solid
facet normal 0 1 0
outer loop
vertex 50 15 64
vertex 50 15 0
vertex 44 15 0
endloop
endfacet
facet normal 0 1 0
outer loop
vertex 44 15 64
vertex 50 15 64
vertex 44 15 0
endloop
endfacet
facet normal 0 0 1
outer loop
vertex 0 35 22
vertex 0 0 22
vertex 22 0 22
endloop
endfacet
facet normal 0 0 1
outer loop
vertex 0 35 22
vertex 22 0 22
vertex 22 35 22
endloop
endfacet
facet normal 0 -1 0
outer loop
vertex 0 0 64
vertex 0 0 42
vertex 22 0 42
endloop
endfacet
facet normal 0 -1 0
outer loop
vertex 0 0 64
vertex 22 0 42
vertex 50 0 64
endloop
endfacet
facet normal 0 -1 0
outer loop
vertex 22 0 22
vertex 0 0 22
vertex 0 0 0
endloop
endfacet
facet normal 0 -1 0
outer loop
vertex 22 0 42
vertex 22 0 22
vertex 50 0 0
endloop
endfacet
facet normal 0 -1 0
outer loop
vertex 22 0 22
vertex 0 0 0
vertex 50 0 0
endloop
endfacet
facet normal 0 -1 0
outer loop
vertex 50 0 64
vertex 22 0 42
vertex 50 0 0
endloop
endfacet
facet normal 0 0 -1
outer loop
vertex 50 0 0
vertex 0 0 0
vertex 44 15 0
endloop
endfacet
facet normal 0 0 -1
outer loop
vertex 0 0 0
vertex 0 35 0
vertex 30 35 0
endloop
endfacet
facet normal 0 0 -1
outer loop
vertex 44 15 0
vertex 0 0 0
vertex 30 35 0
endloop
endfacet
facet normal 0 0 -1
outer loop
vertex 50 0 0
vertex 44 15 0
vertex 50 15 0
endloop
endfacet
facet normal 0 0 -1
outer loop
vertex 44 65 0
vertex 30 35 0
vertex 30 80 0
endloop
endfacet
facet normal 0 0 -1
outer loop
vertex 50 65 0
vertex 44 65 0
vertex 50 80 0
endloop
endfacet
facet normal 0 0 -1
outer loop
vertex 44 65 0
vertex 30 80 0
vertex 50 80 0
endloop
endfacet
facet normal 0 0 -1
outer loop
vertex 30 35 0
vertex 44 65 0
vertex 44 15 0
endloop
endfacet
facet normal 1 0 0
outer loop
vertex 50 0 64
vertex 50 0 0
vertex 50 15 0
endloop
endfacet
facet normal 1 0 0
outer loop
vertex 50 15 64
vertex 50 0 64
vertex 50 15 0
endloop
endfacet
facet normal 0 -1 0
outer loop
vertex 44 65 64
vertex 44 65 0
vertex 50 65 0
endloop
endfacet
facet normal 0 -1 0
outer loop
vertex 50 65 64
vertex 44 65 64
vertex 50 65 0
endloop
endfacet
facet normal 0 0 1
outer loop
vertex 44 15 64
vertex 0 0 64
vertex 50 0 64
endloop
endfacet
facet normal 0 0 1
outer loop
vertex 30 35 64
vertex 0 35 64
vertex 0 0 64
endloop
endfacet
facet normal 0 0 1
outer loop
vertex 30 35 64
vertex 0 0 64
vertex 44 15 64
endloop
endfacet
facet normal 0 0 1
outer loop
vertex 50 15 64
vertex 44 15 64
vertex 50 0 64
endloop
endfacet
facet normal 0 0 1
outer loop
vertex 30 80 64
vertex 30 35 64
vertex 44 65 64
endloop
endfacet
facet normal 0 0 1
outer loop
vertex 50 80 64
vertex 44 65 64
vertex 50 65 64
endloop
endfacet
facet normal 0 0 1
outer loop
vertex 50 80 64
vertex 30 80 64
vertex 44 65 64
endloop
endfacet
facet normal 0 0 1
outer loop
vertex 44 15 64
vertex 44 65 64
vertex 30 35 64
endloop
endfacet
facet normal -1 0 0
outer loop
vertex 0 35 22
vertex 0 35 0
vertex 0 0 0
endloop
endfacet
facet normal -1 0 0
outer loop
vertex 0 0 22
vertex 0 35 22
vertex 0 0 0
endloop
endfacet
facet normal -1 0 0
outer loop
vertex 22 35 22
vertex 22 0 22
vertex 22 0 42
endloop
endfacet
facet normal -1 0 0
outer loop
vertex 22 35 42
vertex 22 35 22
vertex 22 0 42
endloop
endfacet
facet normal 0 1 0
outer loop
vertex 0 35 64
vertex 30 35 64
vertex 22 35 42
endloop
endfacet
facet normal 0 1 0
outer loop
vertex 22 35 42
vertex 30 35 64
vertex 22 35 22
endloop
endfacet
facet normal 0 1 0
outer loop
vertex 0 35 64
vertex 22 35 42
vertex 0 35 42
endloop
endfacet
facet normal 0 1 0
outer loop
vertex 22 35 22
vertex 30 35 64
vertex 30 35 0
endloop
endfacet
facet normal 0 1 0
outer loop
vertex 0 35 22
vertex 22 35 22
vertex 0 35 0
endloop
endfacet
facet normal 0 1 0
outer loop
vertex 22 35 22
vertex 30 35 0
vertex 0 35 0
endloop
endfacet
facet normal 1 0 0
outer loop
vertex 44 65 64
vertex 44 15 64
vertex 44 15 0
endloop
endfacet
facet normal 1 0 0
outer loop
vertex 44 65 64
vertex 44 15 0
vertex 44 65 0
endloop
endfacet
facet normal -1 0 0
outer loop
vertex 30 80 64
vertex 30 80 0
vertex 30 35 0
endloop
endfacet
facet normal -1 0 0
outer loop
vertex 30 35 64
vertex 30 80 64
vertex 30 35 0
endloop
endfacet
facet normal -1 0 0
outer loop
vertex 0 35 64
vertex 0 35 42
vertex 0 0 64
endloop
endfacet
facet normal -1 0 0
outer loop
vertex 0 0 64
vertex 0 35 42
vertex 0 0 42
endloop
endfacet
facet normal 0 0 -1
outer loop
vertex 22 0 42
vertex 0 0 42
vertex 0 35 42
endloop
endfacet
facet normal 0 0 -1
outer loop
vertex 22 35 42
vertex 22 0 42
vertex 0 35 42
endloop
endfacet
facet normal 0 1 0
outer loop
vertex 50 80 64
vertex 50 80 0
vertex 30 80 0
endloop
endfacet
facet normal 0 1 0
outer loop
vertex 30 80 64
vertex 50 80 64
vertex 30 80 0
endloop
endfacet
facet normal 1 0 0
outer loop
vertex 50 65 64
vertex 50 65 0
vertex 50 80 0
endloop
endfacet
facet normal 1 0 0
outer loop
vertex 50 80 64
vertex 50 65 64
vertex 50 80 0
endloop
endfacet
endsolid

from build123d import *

# Parameters (mm, degrees)
BOSS_EXTRUDE1_DEPTH = 64
SKETCH4_W           = 20
SKETCH4_H           = 35
CUT_EXTRUDE2_DEPTH  = 22


with BuildPart() as part:
    # Sketch2 → Boss-Extrude1 (new body)
    with BuildSketch(Plane.XY):
        Polygon((0, 0), (50, 0), (50, 15), (44, 15), (44, 65), (50, 65), (50, 80), (30, 80), (30, 35), (0, 35), align=None)
    extrude(amount=BOSS_EXTRUDE1_DEPTH)

    # Sketch4 → Cut-Extrude2 (cut)
    with BuildSketch(Plane.ZY):
        with Locations((32, 17.5)):
            Rectangle(SKETCH4_W, SKETCH4_H)
    extrude(amount=-CUT_EXTRUDE2_DEPTH, mode=Mode.SUBTRACT)


solid = part.part
